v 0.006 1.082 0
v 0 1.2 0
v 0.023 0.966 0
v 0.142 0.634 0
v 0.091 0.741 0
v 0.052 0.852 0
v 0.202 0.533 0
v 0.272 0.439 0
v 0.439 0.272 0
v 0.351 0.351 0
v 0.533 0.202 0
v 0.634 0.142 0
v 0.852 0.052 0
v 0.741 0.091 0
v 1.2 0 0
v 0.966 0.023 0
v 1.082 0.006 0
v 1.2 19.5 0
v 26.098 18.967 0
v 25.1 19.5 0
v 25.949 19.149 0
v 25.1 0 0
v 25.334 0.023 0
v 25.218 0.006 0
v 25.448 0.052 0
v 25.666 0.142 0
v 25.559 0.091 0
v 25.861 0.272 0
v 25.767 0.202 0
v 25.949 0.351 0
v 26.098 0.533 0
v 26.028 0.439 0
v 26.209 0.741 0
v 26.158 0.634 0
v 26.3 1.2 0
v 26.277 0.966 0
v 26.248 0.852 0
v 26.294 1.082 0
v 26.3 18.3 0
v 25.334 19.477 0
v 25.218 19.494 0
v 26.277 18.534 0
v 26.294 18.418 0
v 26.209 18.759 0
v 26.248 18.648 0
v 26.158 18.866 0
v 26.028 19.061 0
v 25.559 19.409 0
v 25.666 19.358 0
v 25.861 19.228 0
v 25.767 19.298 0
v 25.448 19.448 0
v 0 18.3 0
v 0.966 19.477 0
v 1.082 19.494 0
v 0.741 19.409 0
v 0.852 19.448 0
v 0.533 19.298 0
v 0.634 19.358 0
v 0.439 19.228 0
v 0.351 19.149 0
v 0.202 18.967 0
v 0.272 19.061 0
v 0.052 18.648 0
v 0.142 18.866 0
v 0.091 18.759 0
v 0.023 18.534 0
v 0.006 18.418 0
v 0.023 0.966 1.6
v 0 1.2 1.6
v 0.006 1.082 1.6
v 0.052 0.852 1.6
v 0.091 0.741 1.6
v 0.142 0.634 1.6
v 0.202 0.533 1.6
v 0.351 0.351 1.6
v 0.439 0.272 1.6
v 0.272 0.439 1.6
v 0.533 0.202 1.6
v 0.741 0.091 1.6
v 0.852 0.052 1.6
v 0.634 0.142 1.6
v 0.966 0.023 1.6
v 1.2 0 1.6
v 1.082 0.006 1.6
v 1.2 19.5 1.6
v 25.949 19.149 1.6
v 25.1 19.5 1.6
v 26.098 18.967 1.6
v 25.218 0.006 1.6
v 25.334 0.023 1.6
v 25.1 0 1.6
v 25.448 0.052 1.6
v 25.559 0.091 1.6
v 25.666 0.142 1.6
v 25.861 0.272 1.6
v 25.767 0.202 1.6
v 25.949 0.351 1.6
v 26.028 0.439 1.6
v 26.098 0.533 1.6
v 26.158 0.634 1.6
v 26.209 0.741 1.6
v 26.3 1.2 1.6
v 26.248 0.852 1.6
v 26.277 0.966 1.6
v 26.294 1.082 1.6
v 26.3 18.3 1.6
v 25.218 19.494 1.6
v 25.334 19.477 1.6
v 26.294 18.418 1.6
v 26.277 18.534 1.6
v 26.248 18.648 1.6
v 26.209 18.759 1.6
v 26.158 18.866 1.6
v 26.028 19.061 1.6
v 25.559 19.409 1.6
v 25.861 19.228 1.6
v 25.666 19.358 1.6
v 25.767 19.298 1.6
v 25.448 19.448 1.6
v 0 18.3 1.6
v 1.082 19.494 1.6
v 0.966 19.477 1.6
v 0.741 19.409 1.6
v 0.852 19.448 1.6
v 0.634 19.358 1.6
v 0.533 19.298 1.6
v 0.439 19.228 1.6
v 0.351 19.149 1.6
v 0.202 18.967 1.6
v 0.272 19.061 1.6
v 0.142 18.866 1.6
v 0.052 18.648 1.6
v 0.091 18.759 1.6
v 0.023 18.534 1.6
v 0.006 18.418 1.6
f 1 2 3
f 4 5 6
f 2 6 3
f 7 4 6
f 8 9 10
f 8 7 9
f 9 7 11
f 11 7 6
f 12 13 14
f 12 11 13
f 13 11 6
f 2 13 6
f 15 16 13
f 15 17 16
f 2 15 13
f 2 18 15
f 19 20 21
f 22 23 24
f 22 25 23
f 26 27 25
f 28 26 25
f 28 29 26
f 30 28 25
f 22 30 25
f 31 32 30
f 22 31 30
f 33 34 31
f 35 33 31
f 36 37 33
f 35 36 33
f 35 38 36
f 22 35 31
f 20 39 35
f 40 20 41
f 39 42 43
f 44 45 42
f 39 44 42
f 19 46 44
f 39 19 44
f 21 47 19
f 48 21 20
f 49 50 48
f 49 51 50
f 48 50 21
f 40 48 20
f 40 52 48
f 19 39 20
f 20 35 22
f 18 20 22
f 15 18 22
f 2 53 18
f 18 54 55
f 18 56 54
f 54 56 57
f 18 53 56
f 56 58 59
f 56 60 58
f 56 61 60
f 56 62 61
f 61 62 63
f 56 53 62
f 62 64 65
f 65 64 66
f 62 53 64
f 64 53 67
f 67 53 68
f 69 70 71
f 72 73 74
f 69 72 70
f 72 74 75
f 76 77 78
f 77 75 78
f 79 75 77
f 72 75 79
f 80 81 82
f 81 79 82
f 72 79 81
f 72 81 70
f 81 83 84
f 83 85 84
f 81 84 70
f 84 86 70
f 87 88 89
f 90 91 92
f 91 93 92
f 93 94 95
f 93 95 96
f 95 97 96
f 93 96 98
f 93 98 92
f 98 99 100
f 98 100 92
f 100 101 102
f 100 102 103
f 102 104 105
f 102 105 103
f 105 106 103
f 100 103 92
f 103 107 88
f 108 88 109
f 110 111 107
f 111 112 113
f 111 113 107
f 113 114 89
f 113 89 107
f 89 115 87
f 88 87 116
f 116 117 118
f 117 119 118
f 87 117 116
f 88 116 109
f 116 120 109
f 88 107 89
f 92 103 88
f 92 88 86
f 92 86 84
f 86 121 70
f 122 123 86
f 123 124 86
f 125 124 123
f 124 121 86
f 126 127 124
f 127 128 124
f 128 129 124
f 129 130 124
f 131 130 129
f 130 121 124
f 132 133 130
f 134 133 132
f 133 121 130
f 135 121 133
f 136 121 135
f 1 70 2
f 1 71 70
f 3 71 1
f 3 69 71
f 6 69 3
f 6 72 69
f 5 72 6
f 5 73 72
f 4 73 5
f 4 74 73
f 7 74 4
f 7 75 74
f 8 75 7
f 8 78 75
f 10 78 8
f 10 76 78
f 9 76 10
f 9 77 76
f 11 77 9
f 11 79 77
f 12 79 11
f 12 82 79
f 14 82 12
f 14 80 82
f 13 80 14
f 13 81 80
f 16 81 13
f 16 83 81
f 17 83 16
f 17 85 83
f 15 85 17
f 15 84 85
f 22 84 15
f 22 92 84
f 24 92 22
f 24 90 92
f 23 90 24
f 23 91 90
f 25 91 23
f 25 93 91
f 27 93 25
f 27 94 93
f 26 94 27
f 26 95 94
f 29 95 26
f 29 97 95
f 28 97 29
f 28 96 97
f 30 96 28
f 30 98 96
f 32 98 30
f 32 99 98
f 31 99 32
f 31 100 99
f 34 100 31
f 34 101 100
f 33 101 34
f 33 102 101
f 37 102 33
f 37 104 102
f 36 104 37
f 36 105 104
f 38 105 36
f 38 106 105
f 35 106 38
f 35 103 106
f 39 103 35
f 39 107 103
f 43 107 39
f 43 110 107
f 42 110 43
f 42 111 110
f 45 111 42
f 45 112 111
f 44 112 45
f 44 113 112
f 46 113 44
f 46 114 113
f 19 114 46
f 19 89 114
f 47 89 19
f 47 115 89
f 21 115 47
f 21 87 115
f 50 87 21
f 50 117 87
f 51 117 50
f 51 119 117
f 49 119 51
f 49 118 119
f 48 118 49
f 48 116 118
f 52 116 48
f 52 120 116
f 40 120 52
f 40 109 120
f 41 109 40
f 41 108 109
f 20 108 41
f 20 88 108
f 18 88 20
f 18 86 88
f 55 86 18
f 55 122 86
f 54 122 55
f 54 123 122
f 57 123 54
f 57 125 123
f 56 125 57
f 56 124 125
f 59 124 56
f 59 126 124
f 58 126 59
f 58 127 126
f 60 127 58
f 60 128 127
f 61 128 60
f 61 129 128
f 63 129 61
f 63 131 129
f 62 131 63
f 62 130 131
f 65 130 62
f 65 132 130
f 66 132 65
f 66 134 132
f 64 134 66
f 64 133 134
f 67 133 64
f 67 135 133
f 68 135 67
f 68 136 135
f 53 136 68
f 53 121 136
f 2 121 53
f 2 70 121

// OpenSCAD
$fn = 64;

board_x = 26.3;
board_y = 19.5;
board_th = 1.6;

corner_r = 1.2;

module rounded_rect_2d(x, y, r){
    r2 = min(r, min(x,y)/2);
    hull(){
        translate([ r2,  r2]) circle(r=r2);
        translate([x-r2,  r2]) circle(r=r2);
        translate([ r2, y-r2]) circle(r=r2);
        translate([x-r2, y-r2]) circle(r=r2);
    }
}

module pcb(){
    color([0.05, 0.35, 0.12])
    linear_extrude(height=board_th)
        rounded_rect_2d(board_x, board_y, corner_r);
}

pcb();
